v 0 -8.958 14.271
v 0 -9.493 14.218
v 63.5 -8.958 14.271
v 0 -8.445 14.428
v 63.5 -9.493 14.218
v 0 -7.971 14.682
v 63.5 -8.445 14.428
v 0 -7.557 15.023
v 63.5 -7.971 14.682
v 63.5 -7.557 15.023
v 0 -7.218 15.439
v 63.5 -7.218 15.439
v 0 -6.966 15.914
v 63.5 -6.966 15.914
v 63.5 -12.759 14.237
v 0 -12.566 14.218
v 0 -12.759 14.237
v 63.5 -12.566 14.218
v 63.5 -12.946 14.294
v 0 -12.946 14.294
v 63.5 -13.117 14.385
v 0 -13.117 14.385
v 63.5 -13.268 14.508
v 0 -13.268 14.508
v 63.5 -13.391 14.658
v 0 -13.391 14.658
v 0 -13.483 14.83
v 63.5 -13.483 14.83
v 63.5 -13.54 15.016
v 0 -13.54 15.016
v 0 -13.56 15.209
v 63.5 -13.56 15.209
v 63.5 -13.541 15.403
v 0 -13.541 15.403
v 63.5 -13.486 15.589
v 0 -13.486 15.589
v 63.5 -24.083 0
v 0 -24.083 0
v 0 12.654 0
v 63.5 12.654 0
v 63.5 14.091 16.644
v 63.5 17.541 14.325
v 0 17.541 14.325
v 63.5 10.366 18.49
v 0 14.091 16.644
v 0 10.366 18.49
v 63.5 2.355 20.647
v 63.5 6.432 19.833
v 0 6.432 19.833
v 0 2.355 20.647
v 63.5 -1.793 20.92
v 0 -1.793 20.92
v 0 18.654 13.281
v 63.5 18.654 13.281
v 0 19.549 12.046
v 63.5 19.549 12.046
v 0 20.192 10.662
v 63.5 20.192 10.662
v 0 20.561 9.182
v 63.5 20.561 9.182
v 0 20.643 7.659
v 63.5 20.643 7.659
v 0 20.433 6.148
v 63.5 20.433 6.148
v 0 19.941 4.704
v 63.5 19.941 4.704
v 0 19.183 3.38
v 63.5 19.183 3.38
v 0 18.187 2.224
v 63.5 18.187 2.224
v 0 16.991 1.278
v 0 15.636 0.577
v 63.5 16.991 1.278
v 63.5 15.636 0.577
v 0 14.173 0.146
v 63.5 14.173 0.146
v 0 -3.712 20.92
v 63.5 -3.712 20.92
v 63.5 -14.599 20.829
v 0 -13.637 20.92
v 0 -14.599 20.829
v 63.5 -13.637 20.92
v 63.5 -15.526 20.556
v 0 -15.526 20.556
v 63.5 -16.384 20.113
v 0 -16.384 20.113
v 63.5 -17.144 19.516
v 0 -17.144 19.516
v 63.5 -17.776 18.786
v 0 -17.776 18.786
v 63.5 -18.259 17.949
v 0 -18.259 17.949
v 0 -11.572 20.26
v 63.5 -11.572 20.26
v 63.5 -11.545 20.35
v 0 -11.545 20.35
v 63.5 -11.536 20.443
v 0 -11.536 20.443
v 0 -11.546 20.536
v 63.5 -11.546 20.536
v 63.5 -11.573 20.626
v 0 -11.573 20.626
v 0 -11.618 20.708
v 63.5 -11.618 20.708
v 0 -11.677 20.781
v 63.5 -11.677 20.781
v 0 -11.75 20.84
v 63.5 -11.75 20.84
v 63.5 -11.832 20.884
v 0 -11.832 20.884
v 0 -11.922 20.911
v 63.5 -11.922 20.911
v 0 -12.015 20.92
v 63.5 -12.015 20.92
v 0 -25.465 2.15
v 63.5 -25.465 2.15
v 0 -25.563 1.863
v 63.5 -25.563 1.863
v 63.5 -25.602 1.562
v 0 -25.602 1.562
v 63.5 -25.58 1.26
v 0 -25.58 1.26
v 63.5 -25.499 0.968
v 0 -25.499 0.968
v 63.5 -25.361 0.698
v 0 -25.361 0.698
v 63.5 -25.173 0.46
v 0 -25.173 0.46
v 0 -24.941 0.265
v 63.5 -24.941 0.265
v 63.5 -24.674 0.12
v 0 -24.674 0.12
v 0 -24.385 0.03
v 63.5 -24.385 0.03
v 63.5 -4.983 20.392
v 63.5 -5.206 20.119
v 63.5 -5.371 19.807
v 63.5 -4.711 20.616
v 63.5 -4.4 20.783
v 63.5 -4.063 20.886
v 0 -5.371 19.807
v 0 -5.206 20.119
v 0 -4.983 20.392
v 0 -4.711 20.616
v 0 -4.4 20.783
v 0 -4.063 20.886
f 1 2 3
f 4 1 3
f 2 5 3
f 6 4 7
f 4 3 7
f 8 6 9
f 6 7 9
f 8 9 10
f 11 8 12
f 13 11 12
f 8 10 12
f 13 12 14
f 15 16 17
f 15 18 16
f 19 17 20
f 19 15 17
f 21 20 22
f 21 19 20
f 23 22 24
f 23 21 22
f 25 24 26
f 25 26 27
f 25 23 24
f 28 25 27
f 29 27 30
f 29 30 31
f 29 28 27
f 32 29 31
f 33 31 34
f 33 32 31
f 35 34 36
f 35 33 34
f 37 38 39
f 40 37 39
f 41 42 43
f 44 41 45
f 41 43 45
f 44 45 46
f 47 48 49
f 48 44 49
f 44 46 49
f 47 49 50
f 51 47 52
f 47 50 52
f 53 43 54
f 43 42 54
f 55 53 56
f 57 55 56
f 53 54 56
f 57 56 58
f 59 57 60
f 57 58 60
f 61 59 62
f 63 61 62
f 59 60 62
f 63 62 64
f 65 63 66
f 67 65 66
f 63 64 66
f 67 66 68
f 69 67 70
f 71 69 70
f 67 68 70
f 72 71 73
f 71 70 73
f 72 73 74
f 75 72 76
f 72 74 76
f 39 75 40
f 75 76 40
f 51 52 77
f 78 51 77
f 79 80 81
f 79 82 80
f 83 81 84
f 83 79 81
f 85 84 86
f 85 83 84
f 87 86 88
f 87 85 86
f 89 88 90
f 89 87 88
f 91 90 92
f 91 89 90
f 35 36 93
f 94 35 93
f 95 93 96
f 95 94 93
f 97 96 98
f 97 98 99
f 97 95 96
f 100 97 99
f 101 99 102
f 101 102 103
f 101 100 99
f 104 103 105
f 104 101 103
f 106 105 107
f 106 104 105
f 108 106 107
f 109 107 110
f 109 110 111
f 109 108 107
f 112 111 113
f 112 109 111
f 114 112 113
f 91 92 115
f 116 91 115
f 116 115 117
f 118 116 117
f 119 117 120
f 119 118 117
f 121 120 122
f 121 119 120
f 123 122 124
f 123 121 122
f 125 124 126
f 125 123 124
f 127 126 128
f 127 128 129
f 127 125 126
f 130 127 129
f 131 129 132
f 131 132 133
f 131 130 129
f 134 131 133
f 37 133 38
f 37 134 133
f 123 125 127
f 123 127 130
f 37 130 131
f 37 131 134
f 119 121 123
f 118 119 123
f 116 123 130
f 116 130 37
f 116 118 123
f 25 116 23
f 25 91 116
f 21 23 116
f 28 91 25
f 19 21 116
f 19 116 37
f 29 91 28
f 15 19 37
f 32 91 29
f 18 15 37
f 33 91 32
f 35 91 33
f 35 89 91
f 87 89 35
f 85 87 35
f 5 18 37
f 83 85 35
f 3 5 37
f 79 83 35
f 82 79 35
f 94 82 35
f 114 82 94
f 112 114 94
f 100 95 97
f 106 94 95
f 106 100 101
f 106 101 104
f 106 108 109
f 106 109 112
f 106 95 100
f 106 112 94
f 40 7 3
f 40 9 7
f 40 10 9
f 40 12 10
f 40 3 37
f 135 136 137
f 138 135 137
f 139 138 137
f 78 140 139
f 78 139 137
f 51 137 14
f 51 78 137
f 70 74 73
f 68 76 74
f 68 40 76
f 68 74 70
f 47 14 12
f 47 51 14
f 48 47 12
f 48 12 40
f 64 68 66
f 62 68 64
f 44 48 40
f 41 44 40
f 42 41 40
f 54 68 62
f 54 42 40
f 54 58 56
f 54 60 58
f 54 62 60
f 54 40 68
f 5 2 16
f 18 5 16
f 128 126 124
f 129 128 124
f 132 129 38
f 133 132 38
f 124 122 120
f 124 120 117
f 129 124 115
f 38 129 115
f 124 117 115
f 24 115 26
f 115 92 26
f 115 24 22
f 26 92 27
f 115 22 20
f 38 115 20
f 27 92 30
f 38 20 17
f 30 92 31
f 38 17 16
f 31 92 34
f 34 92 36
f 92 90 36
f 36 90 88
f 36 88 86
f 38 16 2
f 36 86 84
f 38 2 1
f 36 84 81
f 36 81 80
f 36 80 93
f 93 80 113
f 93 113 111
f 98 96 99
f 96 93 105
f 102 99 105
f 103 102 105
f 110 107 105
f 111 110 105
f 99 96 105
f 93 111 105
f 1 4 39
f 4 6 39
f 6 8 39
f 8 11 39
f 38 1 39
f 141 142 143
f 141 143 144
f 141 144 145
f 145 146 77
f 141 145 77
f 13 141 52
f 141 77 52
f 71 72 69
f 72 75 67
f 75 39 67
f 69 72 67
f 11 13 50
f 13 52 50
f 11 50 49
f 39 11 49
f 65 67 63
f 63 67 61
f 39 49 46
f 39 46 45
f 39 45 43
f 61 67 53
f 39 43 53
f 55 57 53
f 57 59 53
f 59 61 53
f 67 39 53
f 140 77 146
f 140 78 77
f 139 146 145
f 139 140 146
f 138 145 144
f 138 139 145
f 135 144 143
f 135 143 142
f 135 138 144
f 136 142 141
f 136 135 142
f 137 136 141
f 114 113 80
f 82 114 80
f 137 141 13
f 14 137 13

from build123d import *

# Parameters (mm, degrees)
F1_DEPTH    = 63.5
F2_R        = 1.7934980513
F3_R        = 0.4788394015
F4_R        = 2.7306448225
F5_R        = 0.9937962324
F6_R        = 5.08
F7_R        = 1.519546052
F8_T1_DEPTH = 212.3191575165
F9_R        = 7.9959076321


# Not quite as in the source:
# - a fillet or chamfer that OpenCascade refuses, or shapes differently, is made with other operations: its cross-section is extruded or revolved along the edge and cut away or added


with BuildPart() as f1:
    # F0 (on Right) → F1 (new body)
    with BuildSketch(Plane.YZ):
        Polygon((-16.9031135738, 20.9204703569), (-26.4463126659, 0), (27.971111238, 0), (27.971111238, 20.9204703569), (-4.9152970314, 20.9204703569), (-7.6606271703, 14.2183713615), (-14.0469465405, 14.2183713615), (-11.3016164016, 20.9204703569), align=None)
    extrude(amount=F1_DEPTH)

    # F2
    f2_edges = [f1.edges().sort_by_distance(p)[0] for p in [
        (31.75, -4.915297, 20.92047),
    ]]
    fillet(f2_edges, radius=F2_R)

    # F3
    f3_edges = [f1.edges().sort_by_distance(p)[0] for p in [
        (31.75, -11.301616, 20.92047),
    ]]
    fillet(f3_edges, radius=F3_R)

    # F4
    f4_edges = [f1.edges().sort_by_distance(p)[0] for p in [
        (31.75, -7.660627, 14.218371),
    ]]
    fillet(f4_edges, radius=F4_R)

    # F5
    f5_edges = [f1.edges().sort_by_distance(p)[0] for p in [
        (31.75, -14.046947, 14.218371),
    ]]
    fillet(f5_edges, radius=F5_R)

    # F6
    f6_edges = [f1.edges().sort_by_distance(p)[0] for p in [
        (31.75, -16.903114, 20.92047),
    ]]
    fillet(f6_edges, radius=F6_R)

    # F7
    f7_edges = [f1.edges().sort_by_distance(p)[0] for p in [
        (31.75, -26.446313, 0),
    ]]
    fillet(f7_edges, radius=F7_R)

    # F8: fillet of radius 31.6329347077 on 1 edges, made by hand

    # F8_s2 → F8_t1 (cut)
    with BuildSketch(Plane.YZ.offset(-74.4095787583)):
        with BuildLine():
            ThreePointArc((27.971111238, 0), (16.3976050872, 15.1671535327), (-1.7927202653, 20.9204703569))
            Line((-1.7927202653, 20.9204703569), (27.971111238, 20.9204703569))
            Line((27.971111238, 20.9204703569), (27.971111238, 0))
        make_face()
    extrude(amount=F8_T1_DEPTH, mode=Mode.SUBTRACT)

    # F9
    f9_edges = [f1.edges().sort_by_distance(p)[0] for p in [
        (31.75, 27.971111, 0),
    ]]
    fillet(f9_edges, radius=F9_R)


solid = f1.part
